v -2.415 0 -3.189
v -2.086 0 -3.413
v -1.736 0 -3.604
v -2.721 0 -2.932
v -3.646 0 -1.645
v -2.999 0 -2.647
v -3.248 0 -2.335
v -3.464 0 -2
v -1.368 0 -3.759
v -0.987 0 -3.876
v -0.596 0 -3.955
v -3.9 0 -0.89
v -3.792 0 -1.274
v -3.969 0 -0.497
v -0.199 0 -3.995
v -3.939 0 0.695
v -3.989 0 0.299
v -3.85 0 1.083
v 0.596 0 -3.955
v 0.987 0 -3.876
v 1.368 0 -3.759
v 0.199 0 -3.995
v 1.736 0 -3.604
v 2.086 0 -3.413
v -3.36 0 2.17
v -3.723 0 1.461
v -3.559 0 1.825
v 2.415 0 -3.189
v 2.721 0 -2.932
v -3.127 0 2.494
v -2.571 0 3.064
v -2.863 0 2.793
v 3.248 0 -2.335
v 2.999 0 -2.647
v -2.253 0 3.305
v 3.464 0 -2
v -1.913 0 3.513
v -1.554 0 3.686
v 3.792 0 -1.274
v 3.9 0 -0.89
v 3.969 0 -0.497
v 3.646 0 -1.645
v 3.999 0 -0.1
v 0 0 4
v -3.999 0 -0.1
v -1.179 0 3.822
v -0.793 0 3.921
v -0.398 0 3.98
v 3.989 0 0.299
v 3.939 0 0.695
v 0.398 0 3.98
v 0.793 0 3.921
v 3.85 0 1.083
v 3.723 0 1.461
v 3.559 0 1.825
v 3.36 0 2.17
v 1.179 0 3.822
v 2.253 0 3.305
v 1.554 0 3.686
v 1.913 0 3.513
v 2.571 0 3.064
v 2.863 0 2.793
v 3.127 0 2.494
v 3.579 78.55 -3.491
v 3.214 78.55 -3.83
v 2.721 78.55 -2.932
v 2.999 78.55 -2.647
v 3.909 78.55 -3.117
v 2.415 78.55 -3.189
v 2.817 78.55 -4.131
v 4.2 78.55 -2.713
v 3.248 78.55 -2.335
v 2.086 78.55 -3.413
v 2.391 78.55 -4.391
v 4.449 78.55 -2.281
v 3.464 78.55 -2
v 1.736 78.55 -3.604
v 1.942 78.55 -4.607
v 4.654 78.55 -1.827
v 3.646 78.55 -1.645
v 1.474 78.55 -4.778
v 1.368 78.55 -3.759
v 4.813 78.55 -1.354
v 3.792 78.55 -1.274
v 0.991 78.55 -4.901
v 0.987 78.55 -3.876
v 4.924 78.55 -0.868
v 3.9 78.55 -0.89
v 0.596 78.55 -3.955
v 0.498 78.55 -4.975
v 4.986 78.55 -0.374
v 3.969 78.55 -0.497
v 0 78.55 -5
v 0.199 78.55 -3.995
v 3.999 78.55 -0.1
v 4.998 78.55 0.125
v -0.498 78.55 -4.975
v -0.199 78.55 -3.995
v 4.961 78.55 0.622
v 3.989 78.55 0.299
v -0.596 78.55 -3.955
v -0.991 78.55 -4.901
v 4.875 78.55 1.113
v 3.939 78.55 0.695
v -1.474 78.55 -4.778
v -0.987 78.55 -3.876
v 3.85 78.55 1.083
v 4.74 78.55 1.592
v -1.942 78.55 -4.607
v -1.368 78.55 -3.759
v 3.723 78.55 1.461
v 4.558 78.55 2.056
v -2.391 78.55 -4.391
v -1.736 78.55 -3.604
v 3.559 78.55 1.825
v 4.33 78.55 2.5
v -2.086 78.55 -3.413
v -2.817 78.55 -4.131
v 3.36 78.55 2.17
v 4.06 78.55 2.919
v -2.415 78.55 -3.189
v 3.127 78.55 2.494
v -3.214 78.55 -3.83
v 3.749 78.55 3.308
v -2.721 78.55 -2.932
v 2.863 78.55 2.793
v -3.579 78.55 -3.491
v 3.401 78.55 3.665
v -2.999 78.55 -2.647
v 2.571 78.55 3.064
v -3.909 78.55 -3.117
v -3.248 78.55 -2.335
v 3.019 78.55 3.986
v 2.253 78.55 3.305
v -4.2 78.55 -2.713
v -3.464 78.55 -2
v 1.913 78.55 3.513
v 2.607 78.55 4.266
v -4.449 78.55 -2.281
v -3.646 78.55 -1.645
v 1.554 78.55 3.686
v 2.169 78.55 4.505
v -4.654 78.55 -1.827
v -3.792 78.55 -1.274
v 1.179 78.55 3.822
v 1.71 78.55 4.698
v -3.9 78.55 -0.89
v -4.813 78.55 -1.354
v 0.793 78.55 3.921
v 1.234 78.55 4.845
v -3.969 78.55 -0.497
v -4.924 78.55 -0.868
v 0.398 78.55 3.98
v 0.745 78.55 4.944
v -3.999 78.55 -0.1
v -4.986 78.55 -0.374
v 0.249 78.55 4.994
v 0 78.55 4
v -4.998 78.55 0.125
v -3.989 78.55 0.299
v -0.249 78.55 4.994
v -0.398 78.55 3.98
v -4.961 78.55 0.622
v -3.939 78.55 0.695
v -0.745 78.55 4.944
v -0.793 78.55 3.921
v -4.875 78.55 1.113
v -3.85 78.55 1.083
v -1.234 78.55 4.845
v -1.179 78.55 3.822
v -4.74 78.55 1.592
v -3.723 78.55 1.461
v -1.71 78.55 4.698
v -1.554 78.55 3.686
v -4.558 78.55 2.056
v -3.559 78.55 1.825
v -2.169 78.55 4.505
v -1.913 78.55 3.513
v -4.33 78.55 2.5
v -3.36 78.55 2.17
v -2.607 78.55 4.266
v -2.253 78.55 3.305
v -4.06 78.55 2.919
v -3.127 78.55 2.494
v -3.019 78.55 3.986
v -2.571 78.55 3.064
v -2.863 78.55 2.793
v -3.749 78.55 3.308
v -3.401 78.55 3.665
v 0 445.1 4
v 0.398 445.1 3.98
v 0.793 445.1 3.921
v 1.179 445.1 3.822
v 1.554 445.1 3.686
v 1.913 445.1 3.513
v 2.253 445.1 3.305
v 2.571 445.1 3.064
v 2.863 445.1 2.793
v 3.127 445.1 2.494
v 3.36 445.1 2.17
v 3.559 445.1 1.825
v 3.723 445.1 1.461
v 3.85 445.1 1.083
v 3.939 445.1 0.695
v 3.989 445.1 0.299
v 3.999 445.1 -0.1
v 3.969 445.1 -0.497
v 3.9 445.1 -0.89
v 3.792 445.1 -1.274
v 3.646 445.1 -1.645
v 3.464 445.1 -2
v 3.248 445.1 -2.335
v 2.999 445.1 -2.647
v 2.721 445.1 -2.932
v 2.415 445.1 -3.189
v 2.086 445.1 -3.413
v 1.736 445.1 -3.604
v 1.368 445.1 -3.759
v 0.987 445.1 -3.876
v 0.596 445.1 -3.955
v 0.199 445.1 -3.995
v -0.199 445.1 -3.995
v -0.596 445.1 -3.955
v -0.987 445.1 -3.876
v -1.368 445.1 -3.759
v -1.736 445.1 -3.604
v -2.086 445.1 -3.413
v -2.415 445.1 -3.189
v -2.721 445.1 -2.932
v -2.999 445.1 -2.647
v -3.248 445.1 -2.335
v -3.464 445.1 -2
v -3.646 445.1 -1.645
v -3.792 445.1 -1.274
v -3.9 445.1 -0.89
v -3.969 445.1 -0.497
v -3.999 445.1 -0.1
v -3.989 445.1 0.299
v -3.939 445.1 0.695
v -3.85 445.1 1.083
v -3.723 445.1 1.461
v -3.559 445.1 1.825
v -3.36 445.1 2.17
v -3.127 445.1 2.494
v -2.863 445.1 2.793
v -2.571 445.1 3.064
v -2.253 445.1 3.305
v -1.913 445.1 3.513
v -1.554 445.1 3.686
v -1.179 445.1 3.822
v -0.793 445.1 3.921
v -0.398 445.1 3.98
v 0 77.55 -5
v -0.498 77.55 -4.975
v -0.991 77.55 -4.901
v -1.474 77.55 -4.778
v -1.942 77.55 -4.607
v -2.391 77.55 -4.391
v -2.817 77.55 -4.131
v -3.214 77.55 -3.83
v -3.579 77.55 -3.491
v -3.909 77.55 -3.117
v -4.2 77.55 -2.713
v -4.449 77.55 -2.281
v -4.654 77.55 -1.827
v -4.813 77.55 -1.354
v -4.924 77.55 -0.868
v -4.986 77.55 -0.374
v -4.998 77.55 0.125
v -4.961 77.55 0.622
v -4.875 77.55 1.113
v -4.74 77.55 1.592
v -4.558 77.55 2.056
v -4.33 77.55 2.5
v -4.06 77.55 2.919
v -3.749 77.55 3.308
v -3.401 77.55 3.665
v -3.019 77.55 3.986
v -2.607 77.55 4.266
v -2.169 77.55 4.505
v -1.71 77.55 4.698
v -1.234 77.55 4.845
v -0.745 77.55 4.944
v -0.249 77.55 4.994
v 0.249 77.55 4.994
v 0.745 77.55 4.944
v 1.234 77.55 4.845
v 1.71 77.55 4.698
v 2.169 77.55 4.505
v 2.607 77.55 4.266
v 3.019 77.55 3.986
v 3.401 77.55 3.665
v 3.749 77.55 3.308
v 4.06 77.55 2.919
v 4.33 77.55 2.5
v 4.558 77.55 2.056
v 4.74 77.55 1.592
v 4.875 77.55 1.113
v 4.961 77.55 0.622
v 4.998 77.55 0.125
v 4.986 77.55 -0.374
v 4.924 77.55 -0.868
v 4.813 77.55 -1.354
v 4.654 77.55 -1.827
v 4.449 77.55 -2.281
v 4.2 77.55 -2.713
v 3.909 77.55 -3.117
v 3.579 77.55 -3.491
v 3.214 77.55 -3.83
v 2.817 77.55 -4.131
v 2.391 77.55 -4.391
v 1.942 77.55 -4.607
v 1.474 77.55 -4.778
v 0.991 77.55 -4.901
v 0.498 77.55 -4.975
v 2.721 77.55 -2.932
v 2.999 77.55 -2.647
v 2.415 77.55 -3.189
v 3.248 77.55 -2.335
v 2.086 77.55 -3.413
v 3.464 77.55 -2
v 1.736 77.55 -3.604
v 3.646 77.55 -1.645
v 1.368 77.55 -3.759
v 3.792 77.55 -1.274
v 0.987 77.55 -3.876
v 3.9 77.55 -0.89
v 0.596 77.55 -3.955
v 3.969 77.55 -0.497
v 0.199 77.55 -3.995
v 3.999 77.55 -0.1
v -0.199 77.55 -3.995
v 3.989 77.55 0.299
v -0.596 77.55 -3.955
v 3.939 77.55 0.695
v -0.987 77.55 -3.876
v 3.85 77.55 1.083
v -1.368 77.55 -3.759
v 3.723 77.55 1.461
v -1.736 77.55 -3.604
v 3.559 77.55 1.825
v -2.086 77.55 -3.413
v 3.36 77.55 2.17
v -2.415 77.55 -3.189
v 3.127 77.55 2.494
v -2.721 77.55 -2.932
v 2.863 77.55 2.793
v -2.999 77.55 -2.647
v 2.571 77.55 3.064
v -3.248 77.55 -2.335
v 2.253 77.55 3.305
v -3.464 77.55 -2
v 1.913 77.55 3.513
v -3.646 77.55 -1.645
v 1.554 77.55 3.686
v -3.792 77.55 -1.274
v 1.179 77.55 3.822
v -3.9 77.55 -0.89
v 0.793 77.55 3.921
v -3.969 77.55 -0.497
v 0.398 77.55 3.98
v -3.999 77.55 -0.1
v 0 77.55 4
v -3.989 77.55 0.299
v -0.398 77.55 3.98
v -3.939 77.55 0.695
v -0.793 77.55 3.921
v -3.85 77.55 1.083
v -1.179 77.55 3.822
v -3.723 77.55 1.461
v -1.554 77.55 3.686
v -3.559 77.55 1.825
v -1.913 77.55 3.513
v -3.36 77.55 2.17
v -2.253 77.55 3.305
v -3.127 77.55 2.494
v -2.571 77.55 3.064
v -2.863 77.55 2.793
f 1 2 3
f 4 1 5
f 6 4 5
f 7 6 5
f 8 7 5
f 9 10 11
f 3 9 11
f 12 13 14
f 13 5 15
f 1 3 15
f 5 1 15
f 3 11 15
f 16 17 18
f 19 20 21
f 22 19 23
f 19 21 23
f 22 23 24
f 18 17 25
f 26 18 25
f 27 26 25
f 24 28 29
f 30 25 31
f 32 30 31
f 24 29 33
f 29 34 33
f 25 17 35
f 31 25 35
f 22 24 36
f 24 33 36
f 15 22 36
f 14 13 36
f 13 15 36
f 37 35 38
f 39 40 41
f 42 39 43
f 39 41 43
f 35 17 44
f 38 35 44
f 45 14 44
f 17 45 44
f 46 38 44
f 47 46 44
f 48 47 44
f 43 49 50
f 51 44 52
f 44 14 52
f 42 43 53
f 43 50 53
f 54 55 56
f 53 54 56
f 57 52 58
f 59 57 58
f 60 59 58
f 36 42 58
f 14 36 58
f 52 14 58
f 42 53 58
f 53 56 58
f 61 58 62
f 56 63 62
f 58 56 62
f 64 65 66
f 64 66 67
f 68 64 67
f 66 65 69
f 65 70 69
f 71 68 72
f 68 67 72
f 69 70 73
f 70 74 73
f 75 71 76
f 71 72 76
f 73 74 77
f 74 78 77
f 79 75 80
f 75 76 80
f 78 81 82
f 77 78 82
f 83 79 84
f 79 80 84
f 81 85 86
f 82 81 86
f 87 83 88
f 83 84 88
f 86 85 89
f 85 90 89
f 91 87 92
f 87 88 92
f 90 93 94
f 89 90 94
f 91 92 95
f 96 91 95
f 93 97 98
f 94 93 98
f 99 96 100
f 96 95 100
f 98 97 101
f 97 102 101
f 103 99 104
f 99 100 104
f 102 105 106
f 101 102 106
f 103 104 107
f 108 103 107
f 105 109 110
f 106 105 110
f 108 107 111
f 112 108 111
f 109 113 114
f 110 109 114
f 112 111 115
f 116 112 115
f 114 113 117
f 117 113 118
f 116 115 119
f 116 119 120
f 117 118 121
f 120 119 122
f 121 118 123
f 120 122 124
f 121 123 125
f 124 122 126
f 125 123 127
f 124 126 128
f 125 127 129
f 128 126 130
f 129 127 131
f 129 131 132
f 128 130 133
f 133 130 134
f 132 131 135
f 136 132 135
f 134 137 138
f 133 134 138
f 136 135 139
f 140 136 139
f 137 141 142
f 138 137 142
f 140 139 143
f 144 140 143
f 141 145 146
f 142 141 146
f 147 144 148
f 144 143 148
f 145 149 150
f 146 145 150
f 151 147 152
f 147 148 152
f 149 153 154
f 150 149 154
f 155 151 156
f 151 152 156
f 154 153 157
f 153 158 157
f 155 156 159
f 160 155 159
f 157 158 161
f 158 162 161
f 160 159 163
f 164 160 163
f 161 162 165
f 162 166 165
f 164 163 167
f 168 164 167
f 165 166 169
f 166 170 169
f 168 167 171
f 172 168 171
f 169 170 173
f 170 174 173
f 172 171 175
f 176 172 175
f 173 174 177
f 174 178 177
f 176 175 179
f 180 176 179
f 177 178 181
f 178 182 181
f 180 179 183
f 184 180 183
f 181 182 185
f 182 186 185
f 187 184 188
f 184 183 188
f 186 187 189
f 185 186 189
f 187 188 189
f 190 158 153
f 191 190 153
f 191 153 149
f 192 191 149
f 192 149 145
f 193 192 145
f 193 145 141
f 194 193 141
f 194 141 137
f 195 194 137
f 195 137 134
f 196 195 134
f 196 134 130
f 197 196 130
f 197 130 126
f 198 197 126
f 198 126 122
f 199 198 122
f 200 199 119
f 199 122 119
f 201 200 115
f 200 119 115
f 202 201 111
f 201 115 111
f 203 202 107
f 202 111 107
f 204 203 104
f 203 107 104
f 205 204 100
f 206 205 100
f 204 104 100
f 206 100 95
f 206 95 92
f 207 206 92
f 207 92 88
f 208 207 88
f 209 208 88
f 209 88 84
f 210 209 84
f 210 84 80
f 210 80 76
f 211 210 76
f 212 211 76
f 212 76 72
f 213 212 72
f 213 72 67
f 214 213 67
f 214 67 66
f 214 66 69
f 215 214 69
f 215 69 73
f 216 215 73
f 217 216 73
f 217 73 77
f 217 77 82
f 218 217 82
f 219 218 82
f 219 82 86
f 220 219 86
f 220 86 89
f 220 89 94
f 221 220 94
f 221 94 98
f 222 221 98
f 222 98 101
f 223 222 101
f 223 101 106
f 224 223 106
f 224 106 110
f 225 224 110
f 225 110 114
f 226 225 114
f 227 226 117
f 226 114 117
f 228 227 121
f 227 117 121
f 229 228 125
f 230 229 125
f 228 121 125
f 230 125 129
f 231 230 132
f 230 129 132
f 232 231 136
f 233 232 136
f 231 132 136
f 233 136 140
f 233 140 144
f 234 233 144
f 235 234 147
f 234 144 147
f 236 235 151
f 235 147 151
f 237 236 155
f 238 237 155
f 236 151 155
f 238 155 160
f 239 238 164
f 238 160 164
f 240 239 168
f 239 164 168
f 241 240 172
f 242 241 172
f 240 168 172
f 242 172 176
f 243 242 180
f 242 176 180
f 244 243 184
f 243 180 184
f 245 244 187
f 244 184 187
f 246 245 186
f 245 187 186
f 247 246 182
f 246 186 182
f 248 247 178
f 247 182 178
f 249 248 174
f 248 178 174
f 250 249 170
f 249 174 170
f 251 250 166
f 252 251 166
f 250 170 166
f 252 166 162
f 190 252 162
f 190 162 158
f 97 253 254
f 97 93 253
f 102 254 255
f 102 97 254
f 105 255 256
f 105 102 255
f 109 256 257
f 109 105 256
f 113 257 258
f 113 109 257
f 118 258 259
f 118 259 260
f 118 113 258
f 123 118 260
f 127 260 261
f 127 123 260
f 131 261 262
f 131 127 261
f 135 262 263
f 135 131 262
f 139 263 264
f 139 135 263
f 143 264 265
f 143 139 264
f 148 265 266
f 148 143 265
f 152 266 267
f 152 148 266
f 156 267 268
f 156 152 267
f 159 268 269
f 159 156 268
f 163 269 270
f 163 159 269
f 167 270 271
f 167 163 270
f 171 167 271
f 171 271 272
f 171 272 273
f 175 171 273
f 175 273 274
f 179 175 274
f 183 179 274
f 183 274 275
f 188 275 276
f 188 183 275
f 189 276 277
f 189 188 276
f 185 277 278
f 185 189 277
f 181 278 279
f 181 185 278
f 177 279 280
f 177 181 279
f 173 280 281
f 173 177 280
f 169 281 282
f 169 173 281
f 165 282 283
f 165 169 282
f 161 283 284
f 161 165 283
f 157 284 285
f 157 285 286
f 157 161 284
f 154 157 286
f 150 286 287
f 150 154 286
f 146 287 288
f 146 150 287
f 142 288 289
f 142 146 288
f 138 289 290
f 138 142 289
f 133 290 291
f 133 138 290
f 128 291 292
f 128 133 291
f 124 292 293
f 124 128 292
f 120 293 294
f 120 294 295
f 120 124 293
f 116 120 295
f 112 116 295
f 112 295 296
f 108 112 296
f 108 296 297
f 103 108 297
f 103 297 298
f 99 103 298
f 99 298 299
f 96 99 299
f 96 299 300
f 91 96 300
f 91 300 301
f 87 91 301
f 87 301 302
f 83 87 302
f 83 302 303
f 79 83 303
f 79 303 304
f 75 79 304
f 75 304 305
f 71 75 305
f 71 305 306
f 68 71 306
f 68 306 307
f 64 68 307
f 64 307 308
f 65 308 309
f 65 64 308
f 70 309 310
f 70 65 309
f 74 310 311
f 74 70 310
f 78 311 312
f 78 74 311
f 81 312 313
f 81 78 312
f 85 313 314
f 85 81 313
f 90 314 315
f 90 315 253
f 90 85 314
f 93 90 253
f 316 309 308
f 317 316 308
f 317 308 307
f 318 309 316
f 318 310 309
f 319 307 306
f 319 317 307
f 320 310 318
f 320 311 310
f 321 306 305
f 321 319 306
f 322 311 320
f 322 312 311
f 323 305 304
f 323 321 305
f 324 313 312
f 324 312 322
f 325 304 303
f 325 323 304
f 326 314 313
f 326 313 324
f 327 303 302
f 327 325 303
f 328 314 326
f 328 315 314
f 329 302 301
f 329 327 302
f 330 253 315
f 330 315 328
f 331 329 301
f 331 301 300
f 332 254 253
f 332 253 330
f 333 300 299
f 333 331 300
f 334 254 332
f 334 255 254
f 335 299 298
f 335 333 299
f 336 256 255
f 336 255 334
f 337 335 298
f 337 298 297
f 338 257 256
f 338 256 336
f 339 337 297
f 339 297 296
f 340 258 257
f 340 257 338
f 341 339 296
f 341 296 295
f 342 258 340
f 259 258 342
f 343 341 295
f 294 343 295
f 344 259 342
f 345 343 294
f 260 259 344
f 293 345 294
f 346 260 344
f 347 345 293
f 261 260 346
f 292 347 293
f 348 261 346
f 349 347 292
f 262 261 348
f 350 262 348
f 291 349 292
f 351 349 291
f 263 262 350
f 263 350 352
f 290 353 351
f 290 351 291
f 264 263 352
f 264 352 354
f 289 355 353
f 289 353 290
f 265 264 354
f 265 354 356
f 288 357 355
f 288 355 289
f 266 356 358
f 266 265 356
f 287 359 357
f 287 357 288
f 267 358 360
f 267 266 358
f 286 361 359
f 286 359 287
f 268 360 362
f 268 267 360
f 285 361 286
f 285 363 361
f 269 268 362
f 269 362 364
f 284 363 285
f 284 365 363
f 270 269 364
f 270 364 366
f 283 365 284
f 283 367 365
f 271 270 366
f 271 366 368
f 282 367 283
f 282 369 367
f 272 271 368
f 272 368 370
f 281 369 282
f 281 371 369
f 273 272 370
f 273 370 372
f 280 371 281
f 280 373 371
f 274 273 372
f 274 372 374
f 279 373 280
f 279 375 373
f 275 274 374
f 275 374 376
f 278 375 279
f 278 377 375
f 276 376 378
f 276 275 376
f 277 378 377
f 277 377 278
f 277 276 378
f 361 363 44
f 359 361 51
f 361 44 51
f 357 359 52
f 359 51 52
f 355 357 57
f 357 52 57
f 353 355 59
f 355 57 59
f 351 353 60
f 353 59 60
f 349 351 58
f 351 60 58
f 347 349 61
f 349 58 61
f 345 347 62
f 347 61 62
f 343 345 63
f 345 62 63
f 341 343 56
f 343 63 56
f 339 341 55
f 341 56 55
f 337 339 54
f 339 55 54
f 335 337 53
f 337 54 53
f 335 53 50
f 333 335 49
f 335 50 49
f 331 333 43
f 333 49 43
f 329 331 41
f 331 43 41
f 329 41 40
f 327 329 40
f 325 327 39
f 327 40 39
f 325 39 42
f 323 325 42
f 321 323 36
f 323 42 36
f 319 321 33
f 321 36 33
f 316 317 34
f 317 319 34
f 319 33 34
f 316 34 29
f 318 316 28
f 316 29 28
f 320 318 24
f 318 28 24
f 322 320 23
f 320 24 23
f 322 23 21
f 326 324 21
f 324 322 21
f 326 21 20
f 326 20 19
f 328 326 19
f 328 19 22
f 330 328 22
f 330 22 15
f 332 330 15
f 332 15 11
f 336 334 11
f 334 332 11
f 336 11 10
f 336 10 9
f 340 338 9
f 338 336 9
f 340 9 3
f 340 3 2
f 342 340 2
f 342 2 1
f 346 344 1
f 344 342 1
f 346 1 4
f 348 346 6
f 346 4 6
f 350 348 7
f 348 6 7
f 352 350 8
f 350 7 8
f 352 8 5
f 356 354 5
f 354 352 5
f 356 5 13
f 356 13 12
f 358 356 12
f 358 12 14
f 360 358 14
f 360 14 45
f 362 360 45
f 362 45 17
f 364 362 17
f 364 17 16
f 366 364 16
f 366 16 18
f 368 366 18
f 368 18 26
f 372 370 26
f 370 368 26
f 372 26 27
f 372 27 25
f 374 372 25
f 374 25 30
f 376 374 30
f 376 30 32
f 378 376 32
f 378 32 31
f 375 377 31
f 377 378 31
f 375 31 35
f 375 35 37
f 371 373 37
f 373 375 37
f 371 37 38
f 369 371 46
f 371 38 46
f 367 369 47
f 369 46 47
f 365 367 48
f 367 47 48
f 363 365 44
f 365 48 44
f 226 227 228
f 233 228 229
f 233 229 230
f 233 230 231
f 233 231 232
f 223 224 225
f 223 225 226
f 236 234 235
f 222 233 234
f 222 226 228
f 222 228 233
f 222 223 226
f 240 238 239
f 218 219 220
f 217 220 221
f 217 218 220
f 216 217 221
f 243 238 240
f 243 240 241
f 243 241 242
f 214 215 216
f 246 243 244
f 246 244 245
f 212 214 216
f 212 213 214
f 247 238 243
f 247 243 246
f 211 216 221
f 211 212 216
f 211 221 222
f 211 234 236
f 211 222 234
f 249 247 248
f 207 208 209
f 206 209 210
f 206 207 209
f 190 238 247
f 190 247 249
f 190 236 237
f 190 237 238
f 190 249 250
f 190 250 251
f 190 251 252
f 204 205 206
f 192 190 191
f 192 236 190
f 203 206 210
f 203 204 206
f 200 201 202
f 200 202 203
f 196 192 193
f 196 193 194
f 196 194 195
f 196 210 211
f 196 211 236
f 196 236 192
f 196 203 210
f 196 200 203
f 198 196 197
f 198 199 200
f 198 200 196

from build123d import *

# Parameters (mm, degrees)
ESBO_O1_R                = 4
RESSALTO_EXTRUS_O2_DEPTH = 445.1
ESBO_O2_W                = 5
ESBO_O2_H                = 1


with BuildPart() as part:
    # Esboço1 → Ressalto-extrusão2 (new body)
    with BuildSketch(Plane(origin=(0, 0, 0), x_dir=(1, 0, 0), z_dir=(0, 1, 0))):
        with Locations(Location((0, 0, 0), (0, 0, 270))):
            Circle(ESBO_O1_R)
    extrude(amount=RESSALTO_EXTRUS_O2_DEPTH)

    # Esboço2 → Revolução1 (revolve)
    with BuildSketch(Plane.XY, mode=Mode.PRIVATE) as revolu_o1_sk:
        with Locations((2.5, 78.05)):
            Rectangle(ESBO_O2_W, ESBO_O2_H)
    revolve(revolu_o1_sk.sketch.rotate(Axis((0, 77.55, 0), (0, 1, 0)), 90), axis=Axis((0, 77.55, 0), (0, 1, 0)))


solid = part.part
